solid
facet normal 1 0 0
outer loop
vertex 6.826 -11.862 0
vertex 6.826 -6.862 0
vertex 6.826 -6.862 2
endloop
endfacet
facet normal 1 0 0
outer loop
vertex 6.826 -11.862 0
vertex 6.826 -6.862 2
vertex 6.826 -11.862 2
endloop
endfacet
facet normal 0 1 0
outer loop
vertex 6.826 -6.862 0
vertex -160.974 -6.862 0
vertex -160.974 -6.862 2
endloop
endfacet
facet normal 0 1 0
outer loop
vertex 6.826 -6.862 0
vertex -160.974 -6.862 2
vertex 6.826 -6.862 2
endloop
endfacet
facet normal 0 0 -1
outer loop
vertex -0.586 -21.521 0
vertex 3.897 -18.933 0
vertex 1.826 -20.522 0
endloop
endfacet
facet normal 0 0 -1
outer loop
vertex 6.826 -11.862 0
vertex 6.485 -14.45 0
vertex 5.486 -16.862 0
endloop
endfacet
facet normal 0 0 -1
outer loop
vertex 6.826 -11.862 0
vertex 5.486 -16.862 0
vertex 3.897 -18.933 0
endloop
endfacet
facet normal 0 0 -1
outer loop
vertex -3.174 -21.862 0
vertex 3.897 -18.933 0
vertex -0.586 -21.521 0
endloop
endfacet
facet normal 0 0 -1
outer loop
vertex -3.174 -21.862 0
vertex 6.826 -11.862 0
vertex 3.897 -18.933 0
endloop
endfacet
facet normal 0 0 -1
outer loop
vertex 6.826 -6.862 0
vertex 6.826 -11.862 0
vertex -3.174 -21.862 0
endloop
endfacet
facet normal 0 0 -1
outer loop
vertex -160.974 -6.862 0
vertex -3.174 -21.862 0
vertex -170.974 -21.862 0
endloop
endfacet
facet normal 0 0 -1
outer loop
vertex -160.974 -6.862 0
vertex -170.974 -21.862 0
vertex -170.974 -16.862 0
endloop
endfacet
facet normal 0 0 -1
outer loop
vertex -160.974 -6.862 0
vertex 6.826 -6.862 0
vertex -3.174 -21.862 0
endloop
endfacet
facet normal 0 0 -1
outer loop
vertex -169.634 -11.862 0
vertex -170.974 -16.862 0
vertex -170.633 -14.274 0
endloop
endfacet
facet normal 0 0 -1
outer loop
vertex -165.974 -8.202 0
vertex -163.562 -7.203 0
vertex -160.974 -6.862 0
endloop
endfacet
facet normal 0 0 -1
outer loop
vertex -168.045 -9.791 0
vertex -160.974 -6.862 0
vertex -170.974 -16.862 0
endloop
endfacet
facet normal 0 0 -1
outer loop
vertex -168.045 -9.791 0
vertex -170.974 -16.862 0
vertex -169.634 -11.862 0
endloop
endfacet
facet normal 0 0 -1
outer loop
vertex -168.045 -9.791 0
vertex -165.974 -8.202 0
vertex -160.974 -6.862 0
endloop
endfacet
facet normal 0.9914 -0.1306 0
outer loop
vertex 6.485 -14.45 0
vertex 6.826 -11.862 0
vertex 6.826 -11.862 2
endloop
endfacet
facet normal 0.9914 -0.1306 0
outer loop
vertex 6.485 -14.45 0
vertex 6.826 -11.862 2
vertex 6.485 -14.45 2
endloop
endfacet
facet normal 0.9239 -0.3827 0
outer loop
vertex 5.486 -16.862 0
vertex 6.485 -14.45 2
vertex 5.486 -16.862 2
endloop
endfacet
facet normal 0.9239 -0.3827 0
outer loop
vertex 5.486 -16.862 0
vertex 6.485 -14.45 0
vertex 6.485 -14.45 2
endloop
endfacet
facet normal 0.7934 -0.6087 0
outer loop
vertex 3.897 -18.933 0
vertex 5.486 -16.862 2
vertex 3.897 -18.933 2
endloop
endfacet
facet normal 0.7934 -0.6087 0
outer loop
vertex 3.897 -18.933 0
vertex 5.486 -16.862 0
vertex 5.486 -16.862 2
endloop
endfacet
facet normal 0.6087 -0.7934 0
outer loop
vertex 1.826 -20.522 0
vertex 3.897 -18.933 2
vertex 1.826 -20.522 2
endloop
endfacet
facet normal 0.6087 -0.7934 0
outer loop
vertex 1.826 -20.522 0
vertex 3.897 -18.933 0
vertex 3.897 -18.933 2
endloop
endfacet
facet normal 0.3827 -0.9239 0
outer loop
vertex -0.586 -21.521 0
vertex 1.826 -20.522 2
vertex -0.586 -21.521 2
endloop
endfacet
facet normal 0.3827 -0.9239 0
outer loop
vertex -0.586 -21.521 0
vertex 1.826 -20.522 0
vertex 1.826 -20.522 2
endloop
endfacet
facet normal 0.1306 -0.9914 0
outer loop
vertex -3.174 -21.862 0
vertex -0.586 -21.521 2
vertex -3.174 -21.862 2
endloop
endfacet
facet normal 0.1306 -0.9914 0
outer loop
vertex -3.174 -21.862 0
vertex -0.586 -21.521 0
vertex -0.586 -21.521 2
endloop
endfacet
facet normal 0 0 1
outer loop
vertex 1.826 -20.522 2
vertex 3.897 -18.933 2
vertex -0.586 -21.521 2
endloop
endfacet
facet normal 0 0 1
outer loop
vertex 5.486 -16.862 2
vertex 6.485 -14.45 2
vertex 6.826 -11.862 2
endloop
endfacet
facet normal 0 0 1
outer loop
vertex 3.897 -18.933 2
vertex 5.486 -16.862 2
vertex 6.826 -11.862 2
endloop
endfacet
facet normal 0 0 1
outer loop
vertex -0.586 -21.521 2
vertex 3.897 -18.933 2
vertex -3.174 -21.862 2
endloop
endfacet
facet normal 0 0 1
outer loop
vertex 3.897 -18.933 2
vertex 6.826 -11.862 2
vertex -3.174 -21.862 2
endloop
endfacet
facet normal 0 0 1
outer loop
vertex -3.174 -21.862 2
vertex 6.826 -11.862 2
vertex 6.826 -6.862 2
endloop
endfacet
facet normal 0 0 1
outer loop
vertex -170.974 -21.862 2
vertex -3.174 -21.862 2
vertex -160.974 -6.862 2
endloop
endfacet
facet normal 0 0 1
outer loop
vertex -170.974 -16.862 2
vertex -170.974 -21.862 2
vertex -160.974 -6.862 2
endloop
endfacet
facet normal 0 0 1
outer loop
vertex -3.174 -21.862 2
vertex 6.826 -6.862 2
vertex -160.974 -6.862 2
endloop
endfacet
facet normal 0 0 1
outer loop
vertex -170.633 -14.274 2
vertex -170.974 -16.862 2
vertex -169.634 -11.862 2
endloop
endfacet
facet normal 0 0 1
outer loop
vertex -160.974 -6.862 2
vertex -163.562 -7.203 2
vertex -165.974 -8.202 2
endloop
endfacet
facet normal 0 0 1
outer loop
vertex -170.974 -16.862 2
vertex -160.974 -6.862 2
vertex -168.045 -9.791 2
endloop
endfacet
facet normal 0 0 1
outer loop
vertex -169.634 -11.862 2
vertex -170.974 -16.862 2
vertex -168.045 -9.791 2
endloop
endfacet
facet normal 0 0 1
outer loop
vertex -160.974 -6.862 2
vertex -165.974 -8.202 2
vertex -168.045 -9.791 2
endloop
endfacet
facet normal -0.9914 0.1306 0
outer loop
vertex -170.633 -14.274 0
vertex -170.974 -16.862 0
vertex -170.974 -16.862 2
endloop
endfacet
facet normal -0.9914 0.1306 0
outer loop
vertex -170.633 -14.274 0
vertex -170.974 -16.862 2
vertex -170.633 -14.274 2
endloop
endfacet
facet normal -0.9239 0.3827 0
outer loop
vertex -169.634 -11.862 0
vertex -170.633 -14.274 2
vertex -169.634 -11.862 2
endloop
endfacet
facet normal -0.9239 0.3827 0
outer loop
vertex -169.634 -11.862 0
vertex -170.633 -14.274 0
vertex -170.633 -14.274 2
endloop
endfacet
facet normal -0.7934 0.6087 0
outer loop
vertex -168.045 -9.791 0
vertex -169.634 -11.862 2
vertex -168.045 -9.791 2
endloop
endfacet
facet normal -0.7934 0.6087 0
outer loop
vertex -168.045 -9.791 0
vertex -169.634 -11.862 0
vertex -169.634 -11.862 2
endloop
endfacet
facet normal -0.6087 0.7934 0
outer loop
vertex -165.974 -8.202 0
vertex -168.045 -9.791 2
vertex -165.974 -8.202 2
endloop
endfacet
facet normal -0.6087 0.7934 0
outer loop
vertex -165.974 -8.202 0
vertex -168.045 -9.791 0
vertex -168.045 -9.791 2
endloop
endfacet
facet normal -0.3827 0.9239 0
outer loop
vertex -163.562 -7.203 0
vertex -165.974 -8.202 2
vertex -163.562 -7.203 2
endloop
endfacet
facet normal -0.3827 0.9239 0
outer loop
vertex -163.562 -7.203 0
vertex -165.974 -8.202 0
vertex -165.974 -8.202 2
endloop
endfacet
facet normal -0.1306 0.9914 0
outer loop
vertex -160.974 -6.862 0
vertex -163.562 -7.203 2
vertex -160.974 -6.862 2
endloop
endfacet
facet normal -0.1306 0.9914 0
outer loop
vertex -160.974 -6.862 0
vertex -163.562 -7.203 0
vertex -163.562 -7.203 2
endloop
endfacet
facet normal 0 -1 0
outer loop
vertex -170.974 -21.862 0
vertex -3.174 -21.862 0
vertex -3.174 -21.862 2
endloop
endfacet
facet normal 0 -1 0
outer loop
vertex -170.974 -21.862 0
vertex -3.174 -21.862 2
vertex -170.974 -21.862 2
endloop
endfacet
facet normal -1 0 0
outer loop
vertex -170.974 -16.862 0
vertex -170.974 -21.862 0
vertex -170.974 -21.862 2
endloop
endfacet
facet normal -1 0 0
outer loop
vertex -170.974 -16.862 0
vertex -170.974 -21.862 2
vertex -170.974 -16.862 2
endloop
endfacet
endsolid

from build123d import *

# Parameters (mm, degrees)
BOSS_EXTRUDE1_DEPTH = 2


with BuildPart() as part:
    # Sketch1 → Boss-Extrude1 (new body)
    with BuildSketch(Plane.XY):
        with BuildLine():
            Line((-160.973915689, -6.861918673), (6.826084311, -6.861918673))
            Line((6.826084311, -6.861918673), (6.826084311, -11.861918673))
            ThreePointArc((6.826084311, -11.861918673), (3.897152123, -18.932986485), (-3.173915689, -21.861918673))
            Line((-3.173915689, -21.861918673), (-170.973915689, -21.861918673))
            Line((-170.973915689, -21.861918673), (-170.973915689, -16.861918673))
            ThreePointArc((-170.973915689, -16.861918673), (-168.0449835, -9.790850861), (-160.973915689, -6.861918673))
        make_face()
    extrude(amount=BOSS_EXTRUDE1_DEPTH)


solid = part.part
